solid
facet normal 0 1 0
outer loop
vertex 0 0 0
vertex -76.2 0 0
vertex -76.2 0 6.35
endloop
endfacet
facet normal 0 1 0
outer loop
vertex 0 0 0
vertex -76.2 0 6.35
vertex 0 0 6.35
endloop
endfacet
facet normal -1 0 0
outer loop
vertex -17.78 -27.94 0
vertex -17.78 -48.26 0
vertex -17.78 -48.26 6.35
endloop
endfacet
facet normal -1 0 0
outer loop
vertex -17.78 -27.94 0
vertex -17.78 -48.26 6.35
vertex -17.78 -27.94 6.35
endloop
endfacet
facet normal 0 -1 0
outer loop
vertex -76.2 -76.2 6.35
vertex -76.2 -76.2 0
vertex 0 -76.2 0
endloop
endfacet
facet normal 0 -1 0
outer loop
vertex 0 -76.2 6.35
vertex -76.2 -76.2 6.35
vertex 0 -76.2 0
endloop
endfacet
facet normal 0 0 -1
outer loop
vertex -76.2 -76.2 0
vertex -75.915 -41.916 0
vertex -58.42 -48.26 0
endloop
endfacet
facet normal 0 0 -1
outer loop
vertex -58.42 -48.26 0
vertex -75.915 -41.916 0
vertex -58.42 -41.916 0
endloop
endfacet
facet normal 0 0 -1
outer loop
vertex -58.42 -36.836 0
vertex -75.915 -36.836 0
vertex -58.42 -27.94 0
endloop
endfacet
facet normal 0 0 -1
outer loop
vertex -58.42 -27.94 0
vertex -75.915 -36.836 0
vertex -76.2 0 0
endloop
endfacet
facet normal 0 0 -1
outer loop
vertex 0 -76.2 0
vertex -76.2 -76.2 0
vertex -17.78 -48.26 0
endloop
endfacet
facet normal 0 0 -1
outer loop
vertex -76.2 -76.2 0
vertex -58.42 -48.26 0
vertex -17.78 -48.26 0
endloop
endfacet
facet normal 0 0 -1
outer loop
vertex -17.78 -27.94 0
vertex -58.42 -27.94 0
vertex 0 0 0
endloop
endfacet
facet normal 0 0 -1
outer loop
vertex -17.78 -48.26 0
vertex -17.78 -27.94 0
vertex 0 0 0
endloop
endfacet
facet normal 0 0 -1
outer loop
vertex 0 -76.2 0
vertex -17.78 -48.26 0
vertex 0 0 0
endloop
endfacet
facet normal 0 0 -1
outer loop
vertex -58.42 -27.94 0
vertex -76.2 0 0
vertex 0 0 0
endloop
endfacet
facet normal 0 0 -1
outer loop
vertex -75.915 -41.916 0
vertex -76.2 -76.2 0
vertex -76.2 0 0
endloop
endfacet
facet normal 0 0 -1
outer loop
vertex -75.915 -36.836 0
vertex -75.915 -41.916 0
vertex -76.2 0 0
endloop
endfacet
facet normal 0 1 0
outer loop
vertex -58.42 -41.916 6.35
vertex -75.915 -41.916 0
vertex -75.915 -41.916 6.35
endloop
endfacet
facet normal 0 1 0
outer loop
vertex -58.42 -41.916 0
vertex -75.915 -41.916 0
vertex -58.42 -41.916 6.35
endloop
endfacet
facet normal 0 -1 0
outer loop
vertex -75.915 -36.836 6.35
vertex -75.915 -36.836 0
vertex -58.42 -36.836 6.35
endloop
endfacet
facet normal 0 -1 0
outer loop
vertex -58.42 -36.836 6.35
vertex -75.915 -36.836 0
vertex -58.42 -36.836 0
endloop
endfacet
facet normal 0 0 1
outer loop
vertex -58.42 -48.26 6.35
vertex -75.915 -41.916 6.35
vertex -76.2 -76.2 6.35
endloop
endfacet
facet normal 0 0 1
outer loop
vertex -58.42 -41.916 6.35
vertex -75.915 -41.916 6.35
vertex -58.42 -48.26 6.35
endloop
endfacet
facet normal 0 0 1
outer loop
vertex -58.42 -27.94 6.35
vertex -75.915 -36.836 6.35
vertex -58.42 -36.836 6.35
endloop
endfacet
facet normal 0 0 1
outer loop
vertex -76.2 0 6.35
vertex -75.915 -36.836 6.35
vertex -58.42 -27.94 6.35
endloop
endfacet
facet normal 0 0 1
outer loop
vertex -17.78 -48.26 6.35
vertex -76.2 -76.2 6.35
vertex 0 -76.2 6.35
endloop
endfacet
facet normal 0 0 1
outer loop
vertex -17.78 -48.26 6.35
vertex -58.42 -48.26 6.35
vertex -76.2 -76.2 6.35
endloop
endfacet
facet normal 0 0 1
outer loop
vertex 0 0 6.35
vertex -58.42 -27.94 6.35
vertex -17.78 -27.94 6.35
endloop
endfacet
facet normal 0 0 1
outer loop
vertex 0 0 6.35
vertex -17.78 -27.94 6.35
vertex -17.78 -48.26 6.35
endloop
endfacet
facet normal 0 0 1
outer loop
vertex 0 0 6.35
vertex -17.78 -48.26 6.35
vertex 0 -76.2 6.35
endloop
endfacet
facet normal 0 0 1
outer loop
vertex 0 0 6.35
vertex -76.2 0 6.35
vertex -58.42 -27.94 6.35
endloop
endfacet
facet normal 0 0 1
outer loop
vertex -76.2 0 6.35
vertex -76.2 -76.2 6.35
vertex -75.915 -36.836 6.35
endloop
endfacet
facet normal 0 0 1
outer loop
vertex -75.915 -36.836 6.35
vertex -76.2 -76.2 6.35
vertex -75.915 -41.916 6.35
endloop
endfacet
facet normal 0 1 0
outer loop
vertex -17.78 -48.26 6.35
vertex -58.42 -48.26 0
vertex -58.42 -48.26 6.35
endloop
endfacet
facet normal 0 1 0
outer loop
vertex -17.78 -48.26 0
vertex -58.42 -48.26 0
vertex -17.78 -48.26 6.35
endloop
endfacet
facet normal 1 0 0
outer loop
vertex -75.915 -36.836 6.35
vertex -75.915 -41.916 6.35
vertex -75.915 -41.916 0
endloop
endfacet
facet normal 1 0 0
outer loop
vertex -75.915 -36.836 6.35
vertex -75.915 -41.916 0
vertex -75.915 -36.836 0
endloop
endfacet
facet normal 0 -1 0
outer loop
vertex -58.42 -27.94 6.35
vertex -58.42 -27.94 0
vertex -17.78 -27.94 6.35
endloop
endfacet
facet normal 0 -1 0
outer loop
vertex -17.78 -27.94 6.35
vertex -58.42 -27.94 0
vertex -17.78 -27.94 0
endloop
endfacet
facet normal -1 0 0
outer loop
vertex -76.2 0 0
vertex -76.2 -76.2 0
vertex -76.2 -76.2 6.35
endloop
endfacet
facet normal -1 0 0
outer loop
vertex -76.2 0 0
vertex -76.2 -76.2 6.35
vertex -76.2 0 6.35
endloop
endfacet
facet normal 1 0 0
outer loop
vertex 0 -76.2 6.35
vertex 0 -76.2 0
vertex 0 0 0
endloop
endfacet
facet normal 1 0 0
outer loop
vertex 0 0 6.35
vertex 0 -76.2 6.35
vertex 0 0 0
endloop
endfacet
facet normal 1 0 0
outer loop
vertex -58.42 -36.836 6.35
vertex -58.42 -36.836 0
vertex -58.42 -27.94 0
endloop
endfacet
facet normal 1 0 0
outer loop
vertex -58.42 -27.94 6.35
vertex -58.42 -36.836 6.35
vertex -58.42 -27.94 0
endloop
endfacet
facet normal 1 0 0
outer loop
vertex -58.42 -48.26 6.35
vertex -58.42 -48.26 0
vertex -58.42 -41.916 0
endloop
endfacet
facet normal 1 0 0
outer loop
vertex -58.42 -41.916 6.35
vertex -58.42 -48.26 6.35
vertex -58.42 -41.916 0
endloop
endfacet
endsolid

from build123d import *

# Parameters (mm, degrees)
F1_W     = 76.2
F1_H     = 76.2
F1_W_2   = 40.64
F1_H_2   = 20.32
F2_DEPTH = 6.35
F3_W     = 17.763365
F3_H     = 5.08
F4_DEPTH = 25.4


with BuildPart() as f2:
    # F1 (on face) → F2 (new body)
    with BuildSketch(Plane.XY):
        with Locations((-38.1, -38.1)):
            Rectangle(F1_W, F1_H)
        with Locations((-38.1, -38.1)):
            Rectangle(F1_W_2, F1_H_2, mode=Mode.SUBTRACT)
    extrude(amount=F2_DEPTH)

    # F3 (on face) → F4 (cut)
    with BuildSketch(Plane.XY):
        with Locations((-67.033619, -39.375661)):
            Rectangle(F3_W, F3_H)
    extrude(amount=F4_DEPTH, mode=Mode.SUBTRACT)


solid = f2.part
